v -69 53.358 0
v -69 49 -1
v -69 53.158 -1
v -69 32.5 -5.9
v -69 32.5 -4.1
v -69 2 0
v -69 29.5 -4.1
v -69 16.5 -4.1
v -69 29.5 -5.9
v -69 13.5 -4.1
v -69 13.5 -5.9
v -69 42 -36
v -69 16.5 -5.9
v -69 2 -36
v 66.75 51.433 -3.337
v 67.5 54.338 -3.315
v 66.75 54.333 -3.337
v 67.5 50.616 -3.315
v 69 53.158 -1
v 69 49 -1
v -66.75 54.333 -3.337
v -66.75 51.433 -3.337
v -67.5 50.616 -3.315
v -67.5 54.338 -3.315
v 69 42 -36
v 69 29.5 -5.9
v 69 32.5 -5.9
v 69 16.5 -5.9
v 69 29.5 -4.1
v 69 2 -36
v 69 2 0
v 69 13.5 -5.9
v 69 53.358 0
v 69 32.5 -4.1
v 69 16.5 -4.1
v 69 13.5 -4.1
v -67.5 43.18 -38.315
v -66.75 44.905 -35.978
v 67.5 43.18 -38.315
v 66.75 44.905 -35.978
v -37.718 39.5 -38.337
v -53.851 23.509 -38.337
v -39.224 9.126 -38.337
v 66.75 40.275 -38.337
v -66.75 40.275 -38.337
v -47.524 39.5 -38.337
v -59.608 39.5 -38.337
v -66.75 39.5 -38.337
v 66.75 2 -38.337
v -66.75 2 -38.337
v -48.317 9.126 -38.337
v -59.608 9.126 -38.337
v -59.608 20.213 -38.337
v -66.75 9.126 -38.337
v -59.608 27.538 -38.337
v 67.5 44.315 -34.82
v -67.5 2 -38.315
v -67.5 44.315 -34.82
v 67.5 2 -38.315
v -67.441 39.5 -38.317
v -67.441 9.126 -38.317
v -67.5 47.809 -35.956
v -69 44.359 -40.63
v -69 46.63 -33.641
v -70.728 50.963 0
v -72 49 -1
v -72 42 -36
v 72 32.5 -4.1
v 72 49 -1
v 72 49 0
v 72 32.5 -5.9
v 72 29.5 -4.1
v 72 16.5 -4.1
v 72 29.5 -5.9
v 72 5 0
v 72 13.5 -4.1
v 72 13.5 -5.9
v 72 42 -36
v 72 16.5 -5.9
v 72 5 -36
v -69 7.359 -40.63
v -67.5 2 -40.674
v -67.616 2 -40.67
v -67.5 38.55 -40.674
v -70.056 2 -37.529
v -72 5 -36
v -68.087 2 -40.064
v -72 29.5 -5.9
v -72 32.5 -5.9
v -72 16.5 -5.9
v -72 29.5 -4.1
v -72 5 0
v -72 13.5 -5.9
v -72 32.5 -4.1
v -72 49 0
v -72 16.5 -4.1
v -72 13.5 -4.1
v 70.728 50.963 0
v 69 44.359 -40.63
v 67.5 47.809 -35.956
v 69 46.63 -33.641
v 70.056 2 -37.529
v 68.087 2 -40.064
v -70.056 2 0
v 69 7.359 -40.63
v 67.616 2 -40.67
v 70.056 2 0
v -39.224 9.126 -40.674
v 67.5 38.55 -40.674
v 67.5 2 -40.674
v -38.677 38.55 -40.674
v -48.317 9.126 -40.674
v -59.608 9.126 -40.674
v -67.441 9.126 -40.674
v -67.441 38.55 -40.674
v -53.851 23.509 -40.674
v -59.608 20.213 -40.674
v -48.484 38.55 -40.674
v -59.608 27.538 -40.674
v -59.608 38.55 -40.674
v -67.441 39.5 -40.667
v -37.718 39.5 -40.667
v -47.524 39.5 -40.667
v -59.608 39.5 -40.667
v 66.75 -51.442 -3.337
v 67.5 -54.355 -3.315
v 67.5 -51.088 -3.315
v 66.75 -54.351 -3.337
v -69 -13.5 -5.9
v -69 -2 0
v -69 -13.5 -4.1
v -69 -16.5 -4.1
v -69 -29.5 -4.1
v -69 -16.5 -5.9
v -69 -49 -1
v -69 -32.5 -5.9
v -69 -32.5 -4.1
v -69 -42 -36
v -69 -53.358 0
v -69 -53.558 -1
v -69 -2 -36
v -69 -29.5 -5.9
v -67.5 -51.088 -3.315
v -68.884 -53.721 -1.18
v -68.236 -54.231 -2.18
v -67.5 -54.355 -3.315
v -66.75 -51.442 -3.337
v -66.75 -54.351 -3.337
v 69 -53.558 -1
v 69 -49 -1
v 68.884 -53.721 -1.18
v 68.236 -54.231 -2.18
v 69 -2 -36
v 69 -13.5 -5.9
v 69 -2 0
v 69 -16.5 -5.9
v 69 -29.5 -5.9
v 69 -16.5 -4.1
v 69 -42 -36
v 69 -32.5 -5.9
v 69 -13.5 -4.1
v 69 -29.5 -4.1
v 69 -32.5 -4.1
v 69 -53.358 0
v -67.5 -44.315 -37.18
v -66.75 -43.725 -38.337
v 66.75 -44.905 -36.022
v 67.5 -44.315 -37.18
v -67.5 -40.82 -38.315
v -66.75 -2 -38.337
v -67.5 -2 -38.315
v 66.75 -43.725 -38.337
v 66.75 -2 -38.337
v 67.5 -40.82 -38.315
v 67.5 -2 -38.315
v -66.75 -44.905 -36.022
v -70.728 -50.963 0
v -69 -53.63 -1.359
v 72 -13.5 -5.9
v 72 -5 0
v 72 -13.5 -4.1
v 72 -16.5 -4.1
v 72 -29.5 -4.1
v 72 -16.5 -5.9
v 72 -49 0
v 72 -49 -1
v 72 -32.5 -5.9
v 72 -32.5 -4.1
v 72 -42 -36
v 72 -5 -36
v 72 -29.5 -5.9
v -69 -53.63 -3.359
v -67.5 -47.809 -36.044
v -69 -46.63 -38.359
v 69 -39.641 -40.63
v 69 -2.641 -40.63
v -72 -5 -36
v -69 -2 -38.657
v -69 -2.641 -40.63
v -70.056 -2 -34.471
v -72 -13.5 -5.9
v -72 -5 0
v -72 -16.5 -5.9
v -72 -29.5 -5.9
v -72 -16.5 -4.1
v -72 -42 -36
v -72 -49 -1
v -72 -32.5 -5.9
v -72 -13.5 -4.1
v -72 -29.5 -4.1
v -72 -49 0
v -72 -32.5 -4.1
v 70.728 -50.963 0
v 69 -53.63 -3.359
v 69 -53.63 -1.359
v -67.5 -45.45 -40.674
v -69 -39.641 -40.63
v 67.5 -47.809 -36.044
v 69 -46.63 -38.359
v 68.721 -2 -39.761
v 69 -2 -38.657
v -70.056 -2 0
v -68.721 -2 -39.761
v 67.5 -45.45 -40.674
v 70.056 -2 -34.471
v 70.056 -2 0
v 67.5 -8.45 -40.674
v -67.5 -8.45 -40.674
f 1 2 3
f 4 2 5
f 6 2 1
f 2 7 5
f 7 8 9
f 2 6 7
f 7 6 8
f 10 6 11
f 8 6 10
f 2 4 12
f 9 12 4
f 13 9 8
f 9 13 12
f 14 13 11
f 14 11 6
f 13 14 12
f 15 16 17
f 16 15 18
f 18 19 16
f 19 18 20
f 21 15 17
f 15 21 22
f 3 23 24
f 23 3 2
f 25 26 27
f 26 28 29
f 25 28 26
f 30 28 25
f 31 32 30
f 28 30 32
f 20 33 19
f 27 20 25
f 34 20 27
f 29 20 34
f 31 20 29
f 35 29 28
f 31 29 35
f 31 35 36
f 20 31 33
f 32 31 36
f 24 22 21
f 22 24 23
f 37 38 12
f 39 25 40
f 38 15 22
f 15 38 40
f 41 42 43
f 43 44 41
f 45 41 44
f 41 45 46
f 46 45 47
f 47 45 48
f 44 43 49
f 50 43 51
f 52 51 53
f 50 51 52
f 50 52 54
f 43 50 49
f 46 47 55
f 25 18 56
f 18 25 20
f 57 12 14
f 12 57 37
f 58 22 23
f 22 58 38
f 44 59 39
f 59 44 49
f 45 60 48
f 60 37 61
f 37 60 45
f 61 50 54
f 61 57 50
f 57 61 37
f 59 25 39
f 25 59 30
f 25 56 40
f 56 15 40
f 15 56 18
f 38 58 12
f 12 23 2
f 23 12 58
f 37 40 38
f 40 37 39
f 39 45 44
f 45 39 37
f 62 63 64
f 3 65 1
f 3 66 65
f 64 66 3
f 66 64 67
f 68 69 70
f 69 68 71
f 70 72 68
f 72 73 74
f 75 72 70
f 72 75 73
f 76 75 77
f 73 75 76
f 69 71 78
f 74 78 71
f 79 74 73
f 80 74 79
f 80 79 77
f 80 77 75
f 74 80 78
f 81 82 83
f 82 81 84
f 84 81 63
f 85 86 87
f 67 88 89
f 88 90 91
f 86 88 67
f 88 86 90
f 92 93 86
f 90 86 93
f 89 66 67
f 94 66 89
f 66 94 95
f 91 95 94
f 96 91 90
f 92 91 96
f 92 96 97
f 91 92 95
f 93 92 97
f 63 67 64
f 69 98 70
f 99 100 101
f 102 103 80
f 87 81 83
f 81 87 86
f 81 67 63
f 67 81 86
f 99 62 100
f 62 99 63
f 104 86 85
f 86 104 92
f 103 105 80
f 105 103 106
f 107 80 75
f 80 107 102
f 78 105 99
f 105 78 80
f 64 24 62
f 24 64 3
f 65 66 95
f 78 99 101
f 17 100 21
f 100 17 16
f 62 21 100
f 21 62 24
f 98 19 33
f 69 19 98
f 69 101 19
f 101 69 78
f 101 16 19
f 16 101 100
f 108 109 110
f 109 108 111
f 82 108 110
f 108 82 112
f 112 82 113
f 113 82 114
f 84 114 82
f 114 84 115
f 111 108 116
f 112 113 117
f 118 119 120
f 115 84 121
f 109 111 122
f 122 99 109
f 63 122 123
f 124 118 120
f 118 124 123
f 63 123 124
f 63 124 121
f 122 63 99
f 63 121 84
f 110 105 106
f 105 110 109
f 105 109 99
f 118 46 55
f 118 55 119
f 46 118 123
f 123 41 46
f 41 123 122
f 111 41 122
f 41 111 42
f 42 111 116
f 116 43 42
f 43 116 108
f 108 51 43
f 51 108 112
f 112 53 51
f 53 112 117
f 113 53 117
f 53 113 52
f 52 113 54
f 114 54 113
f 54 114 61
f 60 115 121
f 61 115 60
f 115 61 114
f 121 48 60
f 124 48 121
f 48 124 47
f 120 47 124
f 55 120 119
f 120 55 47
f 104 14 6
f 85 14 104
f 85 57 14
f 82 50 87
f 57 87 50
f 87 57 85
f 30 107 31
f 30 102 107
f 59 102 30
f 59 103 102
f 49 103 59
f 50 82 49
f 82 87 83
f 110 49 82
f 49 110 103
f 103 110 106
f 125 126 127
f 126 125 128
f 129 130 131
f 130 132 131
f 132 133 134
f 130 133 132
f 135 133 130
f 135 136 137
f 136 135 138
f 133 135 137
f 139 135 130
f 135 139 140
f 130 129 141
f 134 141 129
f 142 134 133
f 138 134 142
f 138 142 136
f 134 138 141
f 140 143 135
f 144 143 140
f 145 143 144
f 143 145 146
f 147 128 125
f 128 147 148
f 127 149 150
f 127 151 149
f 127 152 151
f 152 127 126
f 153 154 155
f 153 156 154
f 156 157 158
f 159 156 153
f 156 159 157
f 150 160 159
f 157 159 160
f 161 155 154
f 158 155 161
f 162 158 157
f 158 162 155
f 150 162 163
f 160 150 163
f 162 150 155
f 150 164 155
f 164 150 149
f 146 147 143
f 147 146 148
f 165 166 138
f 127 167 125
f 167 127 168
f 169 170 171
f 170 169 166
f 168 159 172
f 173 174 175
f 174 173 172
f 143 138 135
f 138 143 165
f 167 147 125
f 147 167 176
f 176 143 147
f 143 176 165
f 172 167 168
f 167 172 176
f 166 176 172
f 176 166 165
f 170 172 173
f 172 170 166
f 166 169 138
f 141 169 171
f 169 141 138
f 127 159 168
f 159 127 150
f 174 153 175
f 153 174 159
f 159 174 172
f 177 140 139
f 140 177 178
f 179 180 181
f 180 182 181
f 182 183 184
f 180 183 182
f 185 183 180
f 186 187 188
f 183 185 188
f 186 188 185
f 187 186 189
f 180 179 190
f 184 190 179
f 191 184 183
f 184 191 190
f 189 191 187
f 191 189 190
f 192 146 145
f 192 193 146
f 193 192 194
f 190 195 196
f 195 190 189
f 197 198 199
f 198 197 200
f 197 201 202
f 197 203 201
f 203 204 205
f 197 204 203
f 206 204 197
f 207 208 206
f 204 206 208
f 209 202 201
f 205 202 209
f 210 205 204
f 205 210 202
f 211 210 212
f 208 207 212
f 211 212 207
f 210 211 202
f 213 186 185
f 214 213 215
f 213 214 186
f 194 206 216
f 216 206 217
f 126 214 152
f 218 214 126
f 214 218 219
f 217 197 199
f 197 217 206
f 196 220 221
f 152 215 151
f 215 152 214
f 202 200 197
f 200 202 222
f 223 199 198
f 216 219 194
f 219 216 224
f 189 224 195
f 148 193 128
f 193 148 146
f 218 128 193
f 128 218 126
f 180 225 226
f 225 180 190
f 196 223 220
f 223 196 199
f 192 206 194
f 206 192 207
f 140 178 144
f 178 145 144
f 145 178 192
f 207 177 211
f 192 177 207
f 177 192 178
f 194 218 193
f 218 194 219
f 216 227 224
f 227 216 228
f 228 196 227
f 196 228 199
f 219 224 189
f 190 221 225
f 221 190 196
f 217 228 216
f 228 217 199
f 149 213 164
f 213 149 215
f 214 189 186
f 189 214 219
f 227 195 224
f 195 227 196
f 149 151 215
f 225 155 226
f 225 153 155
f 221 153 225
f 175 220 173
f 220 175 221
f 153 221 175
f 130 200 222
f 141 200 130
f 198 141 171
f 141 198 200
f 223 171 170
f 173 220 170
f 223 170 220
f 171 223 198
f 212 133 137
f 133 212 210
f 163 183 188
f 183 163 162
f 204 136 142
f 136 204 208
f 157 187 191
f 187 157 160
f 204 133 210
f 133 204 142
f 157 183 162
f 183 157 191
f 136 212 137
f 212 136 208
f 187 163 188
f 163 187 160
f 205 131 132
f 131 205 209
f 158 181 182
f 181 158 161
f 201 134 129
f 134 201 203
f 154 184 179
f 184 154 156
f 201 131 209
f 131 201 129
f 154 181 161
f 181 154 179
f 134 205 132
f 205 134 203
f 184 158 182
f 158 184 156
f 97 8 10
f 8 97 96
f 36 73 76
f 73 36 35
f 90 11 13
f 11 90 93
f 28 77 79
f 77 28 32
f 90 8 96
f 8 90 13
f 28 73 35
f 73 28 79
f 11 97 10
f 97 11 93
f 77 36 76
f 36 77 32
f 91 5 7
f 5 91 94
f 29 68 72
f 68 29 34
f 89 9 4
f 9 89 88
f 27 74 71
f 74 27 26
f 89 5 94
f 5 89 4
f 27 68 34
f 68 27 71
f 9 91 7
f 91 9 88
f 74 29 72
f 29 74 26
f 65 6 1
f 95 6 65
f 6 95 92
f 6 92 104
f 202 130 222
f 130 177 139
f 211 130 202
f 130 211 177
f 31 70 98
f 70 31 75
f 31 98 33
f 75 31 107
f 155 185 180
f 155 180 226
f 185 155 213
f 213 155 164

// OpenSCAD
// shower box 0.1
// Copyright 2013 Karsten W. Rohrbach
// karsten@rohrbach.de -- @byteborg
// CC BY-NC 3.0 (free for noncommercial use)

// preview[view:south, tilt:bottom]

// inner width
INNER_X = 135; // [35:5:300] 

// draw box with letter
DRAW_LETTER = "yes"; // [yes, no]

// letter (if enabled)
LETTER = "K"; 

// letter x-offset (if enabled)
LOFS_X = 12; // [0:1:20]

// letter size (if enabled)
FONT_SIZE = 30; // [10:5:30]

/* [Hidden] */

FONT_NAME = "Ubuntu:style=bold";
LOFS_Z = -15;    // letter inset
// INNER_X = 135;  // inner width
INNER_Y = 75;   // inner depth
INNER_Z = 40;   // inner (sleeve) height;
LOWER_Z = 7;    // lower prism
LOWER_Y = 5;    // slit width
THICKNESS = 3;  // overall part thickness
CTIE_X = 1.8;     // cable tie dimensions
CTIE_Y = 3;     // -"-
CTIE_DIST = 16; // cable tie hole distance
CTIE_OFS = 5;   // cable tie recess
q = .1;         // fudge factor
$fn = 6;        // hexagonal chamfer shape

// split for supportless print
difference() {
    union() {
        translate([0, INNER_Y/2+THICKNESS*2, 0]) rotate([90, 0, 0]) part();
        translate([0, -INNER_Y/2-THICKNESS*2, 0]) rotate([-90, 0, 0]) part();
    }
    translate([0, 0, INNER_Z*2/2]) cube(size=[INNER_X*2, INNER_Y*2, INNER_Z*2], center=true);
    // cable tie holes
    for (d=[-1,1]) for(z=[-1,1])
        translate([0, d*(THICKNESS+INNER_Z/2)+z*CTIE_DIST/2, -CTIE_OFS])
          cube(size=[INNER_X*2, CTIE_Y, CTIE_X], center=true);
}

// main part with lettering
module part() {
    difference() {
        outer();
        inner();
        if (DRAW_LETTER == "yes") {
            translate([-INNER_X/2+LOFS_X, -INNER_Y/2-THICKNESS*2-LOFS_Z, 4]) 
            rotate([90, 0, 0]) 
            linear_extrude(20)
            text(LETTER, size=FONT_SIZE, font=FONT_NAME, halign="center");
        }
        translate([0, 0, INNER_Z+100/2+THICKNESS/2])
            cube(size=[INNER_X*2, INNER_Y*2, 100], center=true);
    }
}

// inner space, will be negated
// options for padding, r=corner radius, bottom hole and addl. top height
module inner(pad=0, r=THICKNESS, bothole=1, top=10) {
    minkowski() {
        union() {
            hull() {
                translate([0, 0, INNER_Z/2+THICKNESS*top])
                    cube(size=[INNER_X-THICKNESS+pad, INNER_Y-THICKNESS+pad, INNER_Z-THICKNESS+pad+THICKNESS*top*2], center=true);
                translate([0, 0, -LOWER_Z/2])
                    cube(size=[INNER_X-THICKNESS+pad, LOWER_Y-THICKNESS+pad, LOWER_Z-THICKNESS+pad], center=true);
            }
            if(bothole==1)
                translate([0, 0, -LOWER_Z])
                    cube(size=[INNER_X-THICKNESS+pad, LOWER_Y-THICKNESS+pad, LOWER_Z*4], center=true);
        }
        rotate([27, 0, 0]) sphere(r=r);  // i simply deny to know why this must be 27deg to be flush ;-)
    }
}

// outer shell is inner w/ different corner radius and no holes
module outer() {
    inner(pad=0, r=THICKNESS*2, bothole=0, top=0);
}

//.
